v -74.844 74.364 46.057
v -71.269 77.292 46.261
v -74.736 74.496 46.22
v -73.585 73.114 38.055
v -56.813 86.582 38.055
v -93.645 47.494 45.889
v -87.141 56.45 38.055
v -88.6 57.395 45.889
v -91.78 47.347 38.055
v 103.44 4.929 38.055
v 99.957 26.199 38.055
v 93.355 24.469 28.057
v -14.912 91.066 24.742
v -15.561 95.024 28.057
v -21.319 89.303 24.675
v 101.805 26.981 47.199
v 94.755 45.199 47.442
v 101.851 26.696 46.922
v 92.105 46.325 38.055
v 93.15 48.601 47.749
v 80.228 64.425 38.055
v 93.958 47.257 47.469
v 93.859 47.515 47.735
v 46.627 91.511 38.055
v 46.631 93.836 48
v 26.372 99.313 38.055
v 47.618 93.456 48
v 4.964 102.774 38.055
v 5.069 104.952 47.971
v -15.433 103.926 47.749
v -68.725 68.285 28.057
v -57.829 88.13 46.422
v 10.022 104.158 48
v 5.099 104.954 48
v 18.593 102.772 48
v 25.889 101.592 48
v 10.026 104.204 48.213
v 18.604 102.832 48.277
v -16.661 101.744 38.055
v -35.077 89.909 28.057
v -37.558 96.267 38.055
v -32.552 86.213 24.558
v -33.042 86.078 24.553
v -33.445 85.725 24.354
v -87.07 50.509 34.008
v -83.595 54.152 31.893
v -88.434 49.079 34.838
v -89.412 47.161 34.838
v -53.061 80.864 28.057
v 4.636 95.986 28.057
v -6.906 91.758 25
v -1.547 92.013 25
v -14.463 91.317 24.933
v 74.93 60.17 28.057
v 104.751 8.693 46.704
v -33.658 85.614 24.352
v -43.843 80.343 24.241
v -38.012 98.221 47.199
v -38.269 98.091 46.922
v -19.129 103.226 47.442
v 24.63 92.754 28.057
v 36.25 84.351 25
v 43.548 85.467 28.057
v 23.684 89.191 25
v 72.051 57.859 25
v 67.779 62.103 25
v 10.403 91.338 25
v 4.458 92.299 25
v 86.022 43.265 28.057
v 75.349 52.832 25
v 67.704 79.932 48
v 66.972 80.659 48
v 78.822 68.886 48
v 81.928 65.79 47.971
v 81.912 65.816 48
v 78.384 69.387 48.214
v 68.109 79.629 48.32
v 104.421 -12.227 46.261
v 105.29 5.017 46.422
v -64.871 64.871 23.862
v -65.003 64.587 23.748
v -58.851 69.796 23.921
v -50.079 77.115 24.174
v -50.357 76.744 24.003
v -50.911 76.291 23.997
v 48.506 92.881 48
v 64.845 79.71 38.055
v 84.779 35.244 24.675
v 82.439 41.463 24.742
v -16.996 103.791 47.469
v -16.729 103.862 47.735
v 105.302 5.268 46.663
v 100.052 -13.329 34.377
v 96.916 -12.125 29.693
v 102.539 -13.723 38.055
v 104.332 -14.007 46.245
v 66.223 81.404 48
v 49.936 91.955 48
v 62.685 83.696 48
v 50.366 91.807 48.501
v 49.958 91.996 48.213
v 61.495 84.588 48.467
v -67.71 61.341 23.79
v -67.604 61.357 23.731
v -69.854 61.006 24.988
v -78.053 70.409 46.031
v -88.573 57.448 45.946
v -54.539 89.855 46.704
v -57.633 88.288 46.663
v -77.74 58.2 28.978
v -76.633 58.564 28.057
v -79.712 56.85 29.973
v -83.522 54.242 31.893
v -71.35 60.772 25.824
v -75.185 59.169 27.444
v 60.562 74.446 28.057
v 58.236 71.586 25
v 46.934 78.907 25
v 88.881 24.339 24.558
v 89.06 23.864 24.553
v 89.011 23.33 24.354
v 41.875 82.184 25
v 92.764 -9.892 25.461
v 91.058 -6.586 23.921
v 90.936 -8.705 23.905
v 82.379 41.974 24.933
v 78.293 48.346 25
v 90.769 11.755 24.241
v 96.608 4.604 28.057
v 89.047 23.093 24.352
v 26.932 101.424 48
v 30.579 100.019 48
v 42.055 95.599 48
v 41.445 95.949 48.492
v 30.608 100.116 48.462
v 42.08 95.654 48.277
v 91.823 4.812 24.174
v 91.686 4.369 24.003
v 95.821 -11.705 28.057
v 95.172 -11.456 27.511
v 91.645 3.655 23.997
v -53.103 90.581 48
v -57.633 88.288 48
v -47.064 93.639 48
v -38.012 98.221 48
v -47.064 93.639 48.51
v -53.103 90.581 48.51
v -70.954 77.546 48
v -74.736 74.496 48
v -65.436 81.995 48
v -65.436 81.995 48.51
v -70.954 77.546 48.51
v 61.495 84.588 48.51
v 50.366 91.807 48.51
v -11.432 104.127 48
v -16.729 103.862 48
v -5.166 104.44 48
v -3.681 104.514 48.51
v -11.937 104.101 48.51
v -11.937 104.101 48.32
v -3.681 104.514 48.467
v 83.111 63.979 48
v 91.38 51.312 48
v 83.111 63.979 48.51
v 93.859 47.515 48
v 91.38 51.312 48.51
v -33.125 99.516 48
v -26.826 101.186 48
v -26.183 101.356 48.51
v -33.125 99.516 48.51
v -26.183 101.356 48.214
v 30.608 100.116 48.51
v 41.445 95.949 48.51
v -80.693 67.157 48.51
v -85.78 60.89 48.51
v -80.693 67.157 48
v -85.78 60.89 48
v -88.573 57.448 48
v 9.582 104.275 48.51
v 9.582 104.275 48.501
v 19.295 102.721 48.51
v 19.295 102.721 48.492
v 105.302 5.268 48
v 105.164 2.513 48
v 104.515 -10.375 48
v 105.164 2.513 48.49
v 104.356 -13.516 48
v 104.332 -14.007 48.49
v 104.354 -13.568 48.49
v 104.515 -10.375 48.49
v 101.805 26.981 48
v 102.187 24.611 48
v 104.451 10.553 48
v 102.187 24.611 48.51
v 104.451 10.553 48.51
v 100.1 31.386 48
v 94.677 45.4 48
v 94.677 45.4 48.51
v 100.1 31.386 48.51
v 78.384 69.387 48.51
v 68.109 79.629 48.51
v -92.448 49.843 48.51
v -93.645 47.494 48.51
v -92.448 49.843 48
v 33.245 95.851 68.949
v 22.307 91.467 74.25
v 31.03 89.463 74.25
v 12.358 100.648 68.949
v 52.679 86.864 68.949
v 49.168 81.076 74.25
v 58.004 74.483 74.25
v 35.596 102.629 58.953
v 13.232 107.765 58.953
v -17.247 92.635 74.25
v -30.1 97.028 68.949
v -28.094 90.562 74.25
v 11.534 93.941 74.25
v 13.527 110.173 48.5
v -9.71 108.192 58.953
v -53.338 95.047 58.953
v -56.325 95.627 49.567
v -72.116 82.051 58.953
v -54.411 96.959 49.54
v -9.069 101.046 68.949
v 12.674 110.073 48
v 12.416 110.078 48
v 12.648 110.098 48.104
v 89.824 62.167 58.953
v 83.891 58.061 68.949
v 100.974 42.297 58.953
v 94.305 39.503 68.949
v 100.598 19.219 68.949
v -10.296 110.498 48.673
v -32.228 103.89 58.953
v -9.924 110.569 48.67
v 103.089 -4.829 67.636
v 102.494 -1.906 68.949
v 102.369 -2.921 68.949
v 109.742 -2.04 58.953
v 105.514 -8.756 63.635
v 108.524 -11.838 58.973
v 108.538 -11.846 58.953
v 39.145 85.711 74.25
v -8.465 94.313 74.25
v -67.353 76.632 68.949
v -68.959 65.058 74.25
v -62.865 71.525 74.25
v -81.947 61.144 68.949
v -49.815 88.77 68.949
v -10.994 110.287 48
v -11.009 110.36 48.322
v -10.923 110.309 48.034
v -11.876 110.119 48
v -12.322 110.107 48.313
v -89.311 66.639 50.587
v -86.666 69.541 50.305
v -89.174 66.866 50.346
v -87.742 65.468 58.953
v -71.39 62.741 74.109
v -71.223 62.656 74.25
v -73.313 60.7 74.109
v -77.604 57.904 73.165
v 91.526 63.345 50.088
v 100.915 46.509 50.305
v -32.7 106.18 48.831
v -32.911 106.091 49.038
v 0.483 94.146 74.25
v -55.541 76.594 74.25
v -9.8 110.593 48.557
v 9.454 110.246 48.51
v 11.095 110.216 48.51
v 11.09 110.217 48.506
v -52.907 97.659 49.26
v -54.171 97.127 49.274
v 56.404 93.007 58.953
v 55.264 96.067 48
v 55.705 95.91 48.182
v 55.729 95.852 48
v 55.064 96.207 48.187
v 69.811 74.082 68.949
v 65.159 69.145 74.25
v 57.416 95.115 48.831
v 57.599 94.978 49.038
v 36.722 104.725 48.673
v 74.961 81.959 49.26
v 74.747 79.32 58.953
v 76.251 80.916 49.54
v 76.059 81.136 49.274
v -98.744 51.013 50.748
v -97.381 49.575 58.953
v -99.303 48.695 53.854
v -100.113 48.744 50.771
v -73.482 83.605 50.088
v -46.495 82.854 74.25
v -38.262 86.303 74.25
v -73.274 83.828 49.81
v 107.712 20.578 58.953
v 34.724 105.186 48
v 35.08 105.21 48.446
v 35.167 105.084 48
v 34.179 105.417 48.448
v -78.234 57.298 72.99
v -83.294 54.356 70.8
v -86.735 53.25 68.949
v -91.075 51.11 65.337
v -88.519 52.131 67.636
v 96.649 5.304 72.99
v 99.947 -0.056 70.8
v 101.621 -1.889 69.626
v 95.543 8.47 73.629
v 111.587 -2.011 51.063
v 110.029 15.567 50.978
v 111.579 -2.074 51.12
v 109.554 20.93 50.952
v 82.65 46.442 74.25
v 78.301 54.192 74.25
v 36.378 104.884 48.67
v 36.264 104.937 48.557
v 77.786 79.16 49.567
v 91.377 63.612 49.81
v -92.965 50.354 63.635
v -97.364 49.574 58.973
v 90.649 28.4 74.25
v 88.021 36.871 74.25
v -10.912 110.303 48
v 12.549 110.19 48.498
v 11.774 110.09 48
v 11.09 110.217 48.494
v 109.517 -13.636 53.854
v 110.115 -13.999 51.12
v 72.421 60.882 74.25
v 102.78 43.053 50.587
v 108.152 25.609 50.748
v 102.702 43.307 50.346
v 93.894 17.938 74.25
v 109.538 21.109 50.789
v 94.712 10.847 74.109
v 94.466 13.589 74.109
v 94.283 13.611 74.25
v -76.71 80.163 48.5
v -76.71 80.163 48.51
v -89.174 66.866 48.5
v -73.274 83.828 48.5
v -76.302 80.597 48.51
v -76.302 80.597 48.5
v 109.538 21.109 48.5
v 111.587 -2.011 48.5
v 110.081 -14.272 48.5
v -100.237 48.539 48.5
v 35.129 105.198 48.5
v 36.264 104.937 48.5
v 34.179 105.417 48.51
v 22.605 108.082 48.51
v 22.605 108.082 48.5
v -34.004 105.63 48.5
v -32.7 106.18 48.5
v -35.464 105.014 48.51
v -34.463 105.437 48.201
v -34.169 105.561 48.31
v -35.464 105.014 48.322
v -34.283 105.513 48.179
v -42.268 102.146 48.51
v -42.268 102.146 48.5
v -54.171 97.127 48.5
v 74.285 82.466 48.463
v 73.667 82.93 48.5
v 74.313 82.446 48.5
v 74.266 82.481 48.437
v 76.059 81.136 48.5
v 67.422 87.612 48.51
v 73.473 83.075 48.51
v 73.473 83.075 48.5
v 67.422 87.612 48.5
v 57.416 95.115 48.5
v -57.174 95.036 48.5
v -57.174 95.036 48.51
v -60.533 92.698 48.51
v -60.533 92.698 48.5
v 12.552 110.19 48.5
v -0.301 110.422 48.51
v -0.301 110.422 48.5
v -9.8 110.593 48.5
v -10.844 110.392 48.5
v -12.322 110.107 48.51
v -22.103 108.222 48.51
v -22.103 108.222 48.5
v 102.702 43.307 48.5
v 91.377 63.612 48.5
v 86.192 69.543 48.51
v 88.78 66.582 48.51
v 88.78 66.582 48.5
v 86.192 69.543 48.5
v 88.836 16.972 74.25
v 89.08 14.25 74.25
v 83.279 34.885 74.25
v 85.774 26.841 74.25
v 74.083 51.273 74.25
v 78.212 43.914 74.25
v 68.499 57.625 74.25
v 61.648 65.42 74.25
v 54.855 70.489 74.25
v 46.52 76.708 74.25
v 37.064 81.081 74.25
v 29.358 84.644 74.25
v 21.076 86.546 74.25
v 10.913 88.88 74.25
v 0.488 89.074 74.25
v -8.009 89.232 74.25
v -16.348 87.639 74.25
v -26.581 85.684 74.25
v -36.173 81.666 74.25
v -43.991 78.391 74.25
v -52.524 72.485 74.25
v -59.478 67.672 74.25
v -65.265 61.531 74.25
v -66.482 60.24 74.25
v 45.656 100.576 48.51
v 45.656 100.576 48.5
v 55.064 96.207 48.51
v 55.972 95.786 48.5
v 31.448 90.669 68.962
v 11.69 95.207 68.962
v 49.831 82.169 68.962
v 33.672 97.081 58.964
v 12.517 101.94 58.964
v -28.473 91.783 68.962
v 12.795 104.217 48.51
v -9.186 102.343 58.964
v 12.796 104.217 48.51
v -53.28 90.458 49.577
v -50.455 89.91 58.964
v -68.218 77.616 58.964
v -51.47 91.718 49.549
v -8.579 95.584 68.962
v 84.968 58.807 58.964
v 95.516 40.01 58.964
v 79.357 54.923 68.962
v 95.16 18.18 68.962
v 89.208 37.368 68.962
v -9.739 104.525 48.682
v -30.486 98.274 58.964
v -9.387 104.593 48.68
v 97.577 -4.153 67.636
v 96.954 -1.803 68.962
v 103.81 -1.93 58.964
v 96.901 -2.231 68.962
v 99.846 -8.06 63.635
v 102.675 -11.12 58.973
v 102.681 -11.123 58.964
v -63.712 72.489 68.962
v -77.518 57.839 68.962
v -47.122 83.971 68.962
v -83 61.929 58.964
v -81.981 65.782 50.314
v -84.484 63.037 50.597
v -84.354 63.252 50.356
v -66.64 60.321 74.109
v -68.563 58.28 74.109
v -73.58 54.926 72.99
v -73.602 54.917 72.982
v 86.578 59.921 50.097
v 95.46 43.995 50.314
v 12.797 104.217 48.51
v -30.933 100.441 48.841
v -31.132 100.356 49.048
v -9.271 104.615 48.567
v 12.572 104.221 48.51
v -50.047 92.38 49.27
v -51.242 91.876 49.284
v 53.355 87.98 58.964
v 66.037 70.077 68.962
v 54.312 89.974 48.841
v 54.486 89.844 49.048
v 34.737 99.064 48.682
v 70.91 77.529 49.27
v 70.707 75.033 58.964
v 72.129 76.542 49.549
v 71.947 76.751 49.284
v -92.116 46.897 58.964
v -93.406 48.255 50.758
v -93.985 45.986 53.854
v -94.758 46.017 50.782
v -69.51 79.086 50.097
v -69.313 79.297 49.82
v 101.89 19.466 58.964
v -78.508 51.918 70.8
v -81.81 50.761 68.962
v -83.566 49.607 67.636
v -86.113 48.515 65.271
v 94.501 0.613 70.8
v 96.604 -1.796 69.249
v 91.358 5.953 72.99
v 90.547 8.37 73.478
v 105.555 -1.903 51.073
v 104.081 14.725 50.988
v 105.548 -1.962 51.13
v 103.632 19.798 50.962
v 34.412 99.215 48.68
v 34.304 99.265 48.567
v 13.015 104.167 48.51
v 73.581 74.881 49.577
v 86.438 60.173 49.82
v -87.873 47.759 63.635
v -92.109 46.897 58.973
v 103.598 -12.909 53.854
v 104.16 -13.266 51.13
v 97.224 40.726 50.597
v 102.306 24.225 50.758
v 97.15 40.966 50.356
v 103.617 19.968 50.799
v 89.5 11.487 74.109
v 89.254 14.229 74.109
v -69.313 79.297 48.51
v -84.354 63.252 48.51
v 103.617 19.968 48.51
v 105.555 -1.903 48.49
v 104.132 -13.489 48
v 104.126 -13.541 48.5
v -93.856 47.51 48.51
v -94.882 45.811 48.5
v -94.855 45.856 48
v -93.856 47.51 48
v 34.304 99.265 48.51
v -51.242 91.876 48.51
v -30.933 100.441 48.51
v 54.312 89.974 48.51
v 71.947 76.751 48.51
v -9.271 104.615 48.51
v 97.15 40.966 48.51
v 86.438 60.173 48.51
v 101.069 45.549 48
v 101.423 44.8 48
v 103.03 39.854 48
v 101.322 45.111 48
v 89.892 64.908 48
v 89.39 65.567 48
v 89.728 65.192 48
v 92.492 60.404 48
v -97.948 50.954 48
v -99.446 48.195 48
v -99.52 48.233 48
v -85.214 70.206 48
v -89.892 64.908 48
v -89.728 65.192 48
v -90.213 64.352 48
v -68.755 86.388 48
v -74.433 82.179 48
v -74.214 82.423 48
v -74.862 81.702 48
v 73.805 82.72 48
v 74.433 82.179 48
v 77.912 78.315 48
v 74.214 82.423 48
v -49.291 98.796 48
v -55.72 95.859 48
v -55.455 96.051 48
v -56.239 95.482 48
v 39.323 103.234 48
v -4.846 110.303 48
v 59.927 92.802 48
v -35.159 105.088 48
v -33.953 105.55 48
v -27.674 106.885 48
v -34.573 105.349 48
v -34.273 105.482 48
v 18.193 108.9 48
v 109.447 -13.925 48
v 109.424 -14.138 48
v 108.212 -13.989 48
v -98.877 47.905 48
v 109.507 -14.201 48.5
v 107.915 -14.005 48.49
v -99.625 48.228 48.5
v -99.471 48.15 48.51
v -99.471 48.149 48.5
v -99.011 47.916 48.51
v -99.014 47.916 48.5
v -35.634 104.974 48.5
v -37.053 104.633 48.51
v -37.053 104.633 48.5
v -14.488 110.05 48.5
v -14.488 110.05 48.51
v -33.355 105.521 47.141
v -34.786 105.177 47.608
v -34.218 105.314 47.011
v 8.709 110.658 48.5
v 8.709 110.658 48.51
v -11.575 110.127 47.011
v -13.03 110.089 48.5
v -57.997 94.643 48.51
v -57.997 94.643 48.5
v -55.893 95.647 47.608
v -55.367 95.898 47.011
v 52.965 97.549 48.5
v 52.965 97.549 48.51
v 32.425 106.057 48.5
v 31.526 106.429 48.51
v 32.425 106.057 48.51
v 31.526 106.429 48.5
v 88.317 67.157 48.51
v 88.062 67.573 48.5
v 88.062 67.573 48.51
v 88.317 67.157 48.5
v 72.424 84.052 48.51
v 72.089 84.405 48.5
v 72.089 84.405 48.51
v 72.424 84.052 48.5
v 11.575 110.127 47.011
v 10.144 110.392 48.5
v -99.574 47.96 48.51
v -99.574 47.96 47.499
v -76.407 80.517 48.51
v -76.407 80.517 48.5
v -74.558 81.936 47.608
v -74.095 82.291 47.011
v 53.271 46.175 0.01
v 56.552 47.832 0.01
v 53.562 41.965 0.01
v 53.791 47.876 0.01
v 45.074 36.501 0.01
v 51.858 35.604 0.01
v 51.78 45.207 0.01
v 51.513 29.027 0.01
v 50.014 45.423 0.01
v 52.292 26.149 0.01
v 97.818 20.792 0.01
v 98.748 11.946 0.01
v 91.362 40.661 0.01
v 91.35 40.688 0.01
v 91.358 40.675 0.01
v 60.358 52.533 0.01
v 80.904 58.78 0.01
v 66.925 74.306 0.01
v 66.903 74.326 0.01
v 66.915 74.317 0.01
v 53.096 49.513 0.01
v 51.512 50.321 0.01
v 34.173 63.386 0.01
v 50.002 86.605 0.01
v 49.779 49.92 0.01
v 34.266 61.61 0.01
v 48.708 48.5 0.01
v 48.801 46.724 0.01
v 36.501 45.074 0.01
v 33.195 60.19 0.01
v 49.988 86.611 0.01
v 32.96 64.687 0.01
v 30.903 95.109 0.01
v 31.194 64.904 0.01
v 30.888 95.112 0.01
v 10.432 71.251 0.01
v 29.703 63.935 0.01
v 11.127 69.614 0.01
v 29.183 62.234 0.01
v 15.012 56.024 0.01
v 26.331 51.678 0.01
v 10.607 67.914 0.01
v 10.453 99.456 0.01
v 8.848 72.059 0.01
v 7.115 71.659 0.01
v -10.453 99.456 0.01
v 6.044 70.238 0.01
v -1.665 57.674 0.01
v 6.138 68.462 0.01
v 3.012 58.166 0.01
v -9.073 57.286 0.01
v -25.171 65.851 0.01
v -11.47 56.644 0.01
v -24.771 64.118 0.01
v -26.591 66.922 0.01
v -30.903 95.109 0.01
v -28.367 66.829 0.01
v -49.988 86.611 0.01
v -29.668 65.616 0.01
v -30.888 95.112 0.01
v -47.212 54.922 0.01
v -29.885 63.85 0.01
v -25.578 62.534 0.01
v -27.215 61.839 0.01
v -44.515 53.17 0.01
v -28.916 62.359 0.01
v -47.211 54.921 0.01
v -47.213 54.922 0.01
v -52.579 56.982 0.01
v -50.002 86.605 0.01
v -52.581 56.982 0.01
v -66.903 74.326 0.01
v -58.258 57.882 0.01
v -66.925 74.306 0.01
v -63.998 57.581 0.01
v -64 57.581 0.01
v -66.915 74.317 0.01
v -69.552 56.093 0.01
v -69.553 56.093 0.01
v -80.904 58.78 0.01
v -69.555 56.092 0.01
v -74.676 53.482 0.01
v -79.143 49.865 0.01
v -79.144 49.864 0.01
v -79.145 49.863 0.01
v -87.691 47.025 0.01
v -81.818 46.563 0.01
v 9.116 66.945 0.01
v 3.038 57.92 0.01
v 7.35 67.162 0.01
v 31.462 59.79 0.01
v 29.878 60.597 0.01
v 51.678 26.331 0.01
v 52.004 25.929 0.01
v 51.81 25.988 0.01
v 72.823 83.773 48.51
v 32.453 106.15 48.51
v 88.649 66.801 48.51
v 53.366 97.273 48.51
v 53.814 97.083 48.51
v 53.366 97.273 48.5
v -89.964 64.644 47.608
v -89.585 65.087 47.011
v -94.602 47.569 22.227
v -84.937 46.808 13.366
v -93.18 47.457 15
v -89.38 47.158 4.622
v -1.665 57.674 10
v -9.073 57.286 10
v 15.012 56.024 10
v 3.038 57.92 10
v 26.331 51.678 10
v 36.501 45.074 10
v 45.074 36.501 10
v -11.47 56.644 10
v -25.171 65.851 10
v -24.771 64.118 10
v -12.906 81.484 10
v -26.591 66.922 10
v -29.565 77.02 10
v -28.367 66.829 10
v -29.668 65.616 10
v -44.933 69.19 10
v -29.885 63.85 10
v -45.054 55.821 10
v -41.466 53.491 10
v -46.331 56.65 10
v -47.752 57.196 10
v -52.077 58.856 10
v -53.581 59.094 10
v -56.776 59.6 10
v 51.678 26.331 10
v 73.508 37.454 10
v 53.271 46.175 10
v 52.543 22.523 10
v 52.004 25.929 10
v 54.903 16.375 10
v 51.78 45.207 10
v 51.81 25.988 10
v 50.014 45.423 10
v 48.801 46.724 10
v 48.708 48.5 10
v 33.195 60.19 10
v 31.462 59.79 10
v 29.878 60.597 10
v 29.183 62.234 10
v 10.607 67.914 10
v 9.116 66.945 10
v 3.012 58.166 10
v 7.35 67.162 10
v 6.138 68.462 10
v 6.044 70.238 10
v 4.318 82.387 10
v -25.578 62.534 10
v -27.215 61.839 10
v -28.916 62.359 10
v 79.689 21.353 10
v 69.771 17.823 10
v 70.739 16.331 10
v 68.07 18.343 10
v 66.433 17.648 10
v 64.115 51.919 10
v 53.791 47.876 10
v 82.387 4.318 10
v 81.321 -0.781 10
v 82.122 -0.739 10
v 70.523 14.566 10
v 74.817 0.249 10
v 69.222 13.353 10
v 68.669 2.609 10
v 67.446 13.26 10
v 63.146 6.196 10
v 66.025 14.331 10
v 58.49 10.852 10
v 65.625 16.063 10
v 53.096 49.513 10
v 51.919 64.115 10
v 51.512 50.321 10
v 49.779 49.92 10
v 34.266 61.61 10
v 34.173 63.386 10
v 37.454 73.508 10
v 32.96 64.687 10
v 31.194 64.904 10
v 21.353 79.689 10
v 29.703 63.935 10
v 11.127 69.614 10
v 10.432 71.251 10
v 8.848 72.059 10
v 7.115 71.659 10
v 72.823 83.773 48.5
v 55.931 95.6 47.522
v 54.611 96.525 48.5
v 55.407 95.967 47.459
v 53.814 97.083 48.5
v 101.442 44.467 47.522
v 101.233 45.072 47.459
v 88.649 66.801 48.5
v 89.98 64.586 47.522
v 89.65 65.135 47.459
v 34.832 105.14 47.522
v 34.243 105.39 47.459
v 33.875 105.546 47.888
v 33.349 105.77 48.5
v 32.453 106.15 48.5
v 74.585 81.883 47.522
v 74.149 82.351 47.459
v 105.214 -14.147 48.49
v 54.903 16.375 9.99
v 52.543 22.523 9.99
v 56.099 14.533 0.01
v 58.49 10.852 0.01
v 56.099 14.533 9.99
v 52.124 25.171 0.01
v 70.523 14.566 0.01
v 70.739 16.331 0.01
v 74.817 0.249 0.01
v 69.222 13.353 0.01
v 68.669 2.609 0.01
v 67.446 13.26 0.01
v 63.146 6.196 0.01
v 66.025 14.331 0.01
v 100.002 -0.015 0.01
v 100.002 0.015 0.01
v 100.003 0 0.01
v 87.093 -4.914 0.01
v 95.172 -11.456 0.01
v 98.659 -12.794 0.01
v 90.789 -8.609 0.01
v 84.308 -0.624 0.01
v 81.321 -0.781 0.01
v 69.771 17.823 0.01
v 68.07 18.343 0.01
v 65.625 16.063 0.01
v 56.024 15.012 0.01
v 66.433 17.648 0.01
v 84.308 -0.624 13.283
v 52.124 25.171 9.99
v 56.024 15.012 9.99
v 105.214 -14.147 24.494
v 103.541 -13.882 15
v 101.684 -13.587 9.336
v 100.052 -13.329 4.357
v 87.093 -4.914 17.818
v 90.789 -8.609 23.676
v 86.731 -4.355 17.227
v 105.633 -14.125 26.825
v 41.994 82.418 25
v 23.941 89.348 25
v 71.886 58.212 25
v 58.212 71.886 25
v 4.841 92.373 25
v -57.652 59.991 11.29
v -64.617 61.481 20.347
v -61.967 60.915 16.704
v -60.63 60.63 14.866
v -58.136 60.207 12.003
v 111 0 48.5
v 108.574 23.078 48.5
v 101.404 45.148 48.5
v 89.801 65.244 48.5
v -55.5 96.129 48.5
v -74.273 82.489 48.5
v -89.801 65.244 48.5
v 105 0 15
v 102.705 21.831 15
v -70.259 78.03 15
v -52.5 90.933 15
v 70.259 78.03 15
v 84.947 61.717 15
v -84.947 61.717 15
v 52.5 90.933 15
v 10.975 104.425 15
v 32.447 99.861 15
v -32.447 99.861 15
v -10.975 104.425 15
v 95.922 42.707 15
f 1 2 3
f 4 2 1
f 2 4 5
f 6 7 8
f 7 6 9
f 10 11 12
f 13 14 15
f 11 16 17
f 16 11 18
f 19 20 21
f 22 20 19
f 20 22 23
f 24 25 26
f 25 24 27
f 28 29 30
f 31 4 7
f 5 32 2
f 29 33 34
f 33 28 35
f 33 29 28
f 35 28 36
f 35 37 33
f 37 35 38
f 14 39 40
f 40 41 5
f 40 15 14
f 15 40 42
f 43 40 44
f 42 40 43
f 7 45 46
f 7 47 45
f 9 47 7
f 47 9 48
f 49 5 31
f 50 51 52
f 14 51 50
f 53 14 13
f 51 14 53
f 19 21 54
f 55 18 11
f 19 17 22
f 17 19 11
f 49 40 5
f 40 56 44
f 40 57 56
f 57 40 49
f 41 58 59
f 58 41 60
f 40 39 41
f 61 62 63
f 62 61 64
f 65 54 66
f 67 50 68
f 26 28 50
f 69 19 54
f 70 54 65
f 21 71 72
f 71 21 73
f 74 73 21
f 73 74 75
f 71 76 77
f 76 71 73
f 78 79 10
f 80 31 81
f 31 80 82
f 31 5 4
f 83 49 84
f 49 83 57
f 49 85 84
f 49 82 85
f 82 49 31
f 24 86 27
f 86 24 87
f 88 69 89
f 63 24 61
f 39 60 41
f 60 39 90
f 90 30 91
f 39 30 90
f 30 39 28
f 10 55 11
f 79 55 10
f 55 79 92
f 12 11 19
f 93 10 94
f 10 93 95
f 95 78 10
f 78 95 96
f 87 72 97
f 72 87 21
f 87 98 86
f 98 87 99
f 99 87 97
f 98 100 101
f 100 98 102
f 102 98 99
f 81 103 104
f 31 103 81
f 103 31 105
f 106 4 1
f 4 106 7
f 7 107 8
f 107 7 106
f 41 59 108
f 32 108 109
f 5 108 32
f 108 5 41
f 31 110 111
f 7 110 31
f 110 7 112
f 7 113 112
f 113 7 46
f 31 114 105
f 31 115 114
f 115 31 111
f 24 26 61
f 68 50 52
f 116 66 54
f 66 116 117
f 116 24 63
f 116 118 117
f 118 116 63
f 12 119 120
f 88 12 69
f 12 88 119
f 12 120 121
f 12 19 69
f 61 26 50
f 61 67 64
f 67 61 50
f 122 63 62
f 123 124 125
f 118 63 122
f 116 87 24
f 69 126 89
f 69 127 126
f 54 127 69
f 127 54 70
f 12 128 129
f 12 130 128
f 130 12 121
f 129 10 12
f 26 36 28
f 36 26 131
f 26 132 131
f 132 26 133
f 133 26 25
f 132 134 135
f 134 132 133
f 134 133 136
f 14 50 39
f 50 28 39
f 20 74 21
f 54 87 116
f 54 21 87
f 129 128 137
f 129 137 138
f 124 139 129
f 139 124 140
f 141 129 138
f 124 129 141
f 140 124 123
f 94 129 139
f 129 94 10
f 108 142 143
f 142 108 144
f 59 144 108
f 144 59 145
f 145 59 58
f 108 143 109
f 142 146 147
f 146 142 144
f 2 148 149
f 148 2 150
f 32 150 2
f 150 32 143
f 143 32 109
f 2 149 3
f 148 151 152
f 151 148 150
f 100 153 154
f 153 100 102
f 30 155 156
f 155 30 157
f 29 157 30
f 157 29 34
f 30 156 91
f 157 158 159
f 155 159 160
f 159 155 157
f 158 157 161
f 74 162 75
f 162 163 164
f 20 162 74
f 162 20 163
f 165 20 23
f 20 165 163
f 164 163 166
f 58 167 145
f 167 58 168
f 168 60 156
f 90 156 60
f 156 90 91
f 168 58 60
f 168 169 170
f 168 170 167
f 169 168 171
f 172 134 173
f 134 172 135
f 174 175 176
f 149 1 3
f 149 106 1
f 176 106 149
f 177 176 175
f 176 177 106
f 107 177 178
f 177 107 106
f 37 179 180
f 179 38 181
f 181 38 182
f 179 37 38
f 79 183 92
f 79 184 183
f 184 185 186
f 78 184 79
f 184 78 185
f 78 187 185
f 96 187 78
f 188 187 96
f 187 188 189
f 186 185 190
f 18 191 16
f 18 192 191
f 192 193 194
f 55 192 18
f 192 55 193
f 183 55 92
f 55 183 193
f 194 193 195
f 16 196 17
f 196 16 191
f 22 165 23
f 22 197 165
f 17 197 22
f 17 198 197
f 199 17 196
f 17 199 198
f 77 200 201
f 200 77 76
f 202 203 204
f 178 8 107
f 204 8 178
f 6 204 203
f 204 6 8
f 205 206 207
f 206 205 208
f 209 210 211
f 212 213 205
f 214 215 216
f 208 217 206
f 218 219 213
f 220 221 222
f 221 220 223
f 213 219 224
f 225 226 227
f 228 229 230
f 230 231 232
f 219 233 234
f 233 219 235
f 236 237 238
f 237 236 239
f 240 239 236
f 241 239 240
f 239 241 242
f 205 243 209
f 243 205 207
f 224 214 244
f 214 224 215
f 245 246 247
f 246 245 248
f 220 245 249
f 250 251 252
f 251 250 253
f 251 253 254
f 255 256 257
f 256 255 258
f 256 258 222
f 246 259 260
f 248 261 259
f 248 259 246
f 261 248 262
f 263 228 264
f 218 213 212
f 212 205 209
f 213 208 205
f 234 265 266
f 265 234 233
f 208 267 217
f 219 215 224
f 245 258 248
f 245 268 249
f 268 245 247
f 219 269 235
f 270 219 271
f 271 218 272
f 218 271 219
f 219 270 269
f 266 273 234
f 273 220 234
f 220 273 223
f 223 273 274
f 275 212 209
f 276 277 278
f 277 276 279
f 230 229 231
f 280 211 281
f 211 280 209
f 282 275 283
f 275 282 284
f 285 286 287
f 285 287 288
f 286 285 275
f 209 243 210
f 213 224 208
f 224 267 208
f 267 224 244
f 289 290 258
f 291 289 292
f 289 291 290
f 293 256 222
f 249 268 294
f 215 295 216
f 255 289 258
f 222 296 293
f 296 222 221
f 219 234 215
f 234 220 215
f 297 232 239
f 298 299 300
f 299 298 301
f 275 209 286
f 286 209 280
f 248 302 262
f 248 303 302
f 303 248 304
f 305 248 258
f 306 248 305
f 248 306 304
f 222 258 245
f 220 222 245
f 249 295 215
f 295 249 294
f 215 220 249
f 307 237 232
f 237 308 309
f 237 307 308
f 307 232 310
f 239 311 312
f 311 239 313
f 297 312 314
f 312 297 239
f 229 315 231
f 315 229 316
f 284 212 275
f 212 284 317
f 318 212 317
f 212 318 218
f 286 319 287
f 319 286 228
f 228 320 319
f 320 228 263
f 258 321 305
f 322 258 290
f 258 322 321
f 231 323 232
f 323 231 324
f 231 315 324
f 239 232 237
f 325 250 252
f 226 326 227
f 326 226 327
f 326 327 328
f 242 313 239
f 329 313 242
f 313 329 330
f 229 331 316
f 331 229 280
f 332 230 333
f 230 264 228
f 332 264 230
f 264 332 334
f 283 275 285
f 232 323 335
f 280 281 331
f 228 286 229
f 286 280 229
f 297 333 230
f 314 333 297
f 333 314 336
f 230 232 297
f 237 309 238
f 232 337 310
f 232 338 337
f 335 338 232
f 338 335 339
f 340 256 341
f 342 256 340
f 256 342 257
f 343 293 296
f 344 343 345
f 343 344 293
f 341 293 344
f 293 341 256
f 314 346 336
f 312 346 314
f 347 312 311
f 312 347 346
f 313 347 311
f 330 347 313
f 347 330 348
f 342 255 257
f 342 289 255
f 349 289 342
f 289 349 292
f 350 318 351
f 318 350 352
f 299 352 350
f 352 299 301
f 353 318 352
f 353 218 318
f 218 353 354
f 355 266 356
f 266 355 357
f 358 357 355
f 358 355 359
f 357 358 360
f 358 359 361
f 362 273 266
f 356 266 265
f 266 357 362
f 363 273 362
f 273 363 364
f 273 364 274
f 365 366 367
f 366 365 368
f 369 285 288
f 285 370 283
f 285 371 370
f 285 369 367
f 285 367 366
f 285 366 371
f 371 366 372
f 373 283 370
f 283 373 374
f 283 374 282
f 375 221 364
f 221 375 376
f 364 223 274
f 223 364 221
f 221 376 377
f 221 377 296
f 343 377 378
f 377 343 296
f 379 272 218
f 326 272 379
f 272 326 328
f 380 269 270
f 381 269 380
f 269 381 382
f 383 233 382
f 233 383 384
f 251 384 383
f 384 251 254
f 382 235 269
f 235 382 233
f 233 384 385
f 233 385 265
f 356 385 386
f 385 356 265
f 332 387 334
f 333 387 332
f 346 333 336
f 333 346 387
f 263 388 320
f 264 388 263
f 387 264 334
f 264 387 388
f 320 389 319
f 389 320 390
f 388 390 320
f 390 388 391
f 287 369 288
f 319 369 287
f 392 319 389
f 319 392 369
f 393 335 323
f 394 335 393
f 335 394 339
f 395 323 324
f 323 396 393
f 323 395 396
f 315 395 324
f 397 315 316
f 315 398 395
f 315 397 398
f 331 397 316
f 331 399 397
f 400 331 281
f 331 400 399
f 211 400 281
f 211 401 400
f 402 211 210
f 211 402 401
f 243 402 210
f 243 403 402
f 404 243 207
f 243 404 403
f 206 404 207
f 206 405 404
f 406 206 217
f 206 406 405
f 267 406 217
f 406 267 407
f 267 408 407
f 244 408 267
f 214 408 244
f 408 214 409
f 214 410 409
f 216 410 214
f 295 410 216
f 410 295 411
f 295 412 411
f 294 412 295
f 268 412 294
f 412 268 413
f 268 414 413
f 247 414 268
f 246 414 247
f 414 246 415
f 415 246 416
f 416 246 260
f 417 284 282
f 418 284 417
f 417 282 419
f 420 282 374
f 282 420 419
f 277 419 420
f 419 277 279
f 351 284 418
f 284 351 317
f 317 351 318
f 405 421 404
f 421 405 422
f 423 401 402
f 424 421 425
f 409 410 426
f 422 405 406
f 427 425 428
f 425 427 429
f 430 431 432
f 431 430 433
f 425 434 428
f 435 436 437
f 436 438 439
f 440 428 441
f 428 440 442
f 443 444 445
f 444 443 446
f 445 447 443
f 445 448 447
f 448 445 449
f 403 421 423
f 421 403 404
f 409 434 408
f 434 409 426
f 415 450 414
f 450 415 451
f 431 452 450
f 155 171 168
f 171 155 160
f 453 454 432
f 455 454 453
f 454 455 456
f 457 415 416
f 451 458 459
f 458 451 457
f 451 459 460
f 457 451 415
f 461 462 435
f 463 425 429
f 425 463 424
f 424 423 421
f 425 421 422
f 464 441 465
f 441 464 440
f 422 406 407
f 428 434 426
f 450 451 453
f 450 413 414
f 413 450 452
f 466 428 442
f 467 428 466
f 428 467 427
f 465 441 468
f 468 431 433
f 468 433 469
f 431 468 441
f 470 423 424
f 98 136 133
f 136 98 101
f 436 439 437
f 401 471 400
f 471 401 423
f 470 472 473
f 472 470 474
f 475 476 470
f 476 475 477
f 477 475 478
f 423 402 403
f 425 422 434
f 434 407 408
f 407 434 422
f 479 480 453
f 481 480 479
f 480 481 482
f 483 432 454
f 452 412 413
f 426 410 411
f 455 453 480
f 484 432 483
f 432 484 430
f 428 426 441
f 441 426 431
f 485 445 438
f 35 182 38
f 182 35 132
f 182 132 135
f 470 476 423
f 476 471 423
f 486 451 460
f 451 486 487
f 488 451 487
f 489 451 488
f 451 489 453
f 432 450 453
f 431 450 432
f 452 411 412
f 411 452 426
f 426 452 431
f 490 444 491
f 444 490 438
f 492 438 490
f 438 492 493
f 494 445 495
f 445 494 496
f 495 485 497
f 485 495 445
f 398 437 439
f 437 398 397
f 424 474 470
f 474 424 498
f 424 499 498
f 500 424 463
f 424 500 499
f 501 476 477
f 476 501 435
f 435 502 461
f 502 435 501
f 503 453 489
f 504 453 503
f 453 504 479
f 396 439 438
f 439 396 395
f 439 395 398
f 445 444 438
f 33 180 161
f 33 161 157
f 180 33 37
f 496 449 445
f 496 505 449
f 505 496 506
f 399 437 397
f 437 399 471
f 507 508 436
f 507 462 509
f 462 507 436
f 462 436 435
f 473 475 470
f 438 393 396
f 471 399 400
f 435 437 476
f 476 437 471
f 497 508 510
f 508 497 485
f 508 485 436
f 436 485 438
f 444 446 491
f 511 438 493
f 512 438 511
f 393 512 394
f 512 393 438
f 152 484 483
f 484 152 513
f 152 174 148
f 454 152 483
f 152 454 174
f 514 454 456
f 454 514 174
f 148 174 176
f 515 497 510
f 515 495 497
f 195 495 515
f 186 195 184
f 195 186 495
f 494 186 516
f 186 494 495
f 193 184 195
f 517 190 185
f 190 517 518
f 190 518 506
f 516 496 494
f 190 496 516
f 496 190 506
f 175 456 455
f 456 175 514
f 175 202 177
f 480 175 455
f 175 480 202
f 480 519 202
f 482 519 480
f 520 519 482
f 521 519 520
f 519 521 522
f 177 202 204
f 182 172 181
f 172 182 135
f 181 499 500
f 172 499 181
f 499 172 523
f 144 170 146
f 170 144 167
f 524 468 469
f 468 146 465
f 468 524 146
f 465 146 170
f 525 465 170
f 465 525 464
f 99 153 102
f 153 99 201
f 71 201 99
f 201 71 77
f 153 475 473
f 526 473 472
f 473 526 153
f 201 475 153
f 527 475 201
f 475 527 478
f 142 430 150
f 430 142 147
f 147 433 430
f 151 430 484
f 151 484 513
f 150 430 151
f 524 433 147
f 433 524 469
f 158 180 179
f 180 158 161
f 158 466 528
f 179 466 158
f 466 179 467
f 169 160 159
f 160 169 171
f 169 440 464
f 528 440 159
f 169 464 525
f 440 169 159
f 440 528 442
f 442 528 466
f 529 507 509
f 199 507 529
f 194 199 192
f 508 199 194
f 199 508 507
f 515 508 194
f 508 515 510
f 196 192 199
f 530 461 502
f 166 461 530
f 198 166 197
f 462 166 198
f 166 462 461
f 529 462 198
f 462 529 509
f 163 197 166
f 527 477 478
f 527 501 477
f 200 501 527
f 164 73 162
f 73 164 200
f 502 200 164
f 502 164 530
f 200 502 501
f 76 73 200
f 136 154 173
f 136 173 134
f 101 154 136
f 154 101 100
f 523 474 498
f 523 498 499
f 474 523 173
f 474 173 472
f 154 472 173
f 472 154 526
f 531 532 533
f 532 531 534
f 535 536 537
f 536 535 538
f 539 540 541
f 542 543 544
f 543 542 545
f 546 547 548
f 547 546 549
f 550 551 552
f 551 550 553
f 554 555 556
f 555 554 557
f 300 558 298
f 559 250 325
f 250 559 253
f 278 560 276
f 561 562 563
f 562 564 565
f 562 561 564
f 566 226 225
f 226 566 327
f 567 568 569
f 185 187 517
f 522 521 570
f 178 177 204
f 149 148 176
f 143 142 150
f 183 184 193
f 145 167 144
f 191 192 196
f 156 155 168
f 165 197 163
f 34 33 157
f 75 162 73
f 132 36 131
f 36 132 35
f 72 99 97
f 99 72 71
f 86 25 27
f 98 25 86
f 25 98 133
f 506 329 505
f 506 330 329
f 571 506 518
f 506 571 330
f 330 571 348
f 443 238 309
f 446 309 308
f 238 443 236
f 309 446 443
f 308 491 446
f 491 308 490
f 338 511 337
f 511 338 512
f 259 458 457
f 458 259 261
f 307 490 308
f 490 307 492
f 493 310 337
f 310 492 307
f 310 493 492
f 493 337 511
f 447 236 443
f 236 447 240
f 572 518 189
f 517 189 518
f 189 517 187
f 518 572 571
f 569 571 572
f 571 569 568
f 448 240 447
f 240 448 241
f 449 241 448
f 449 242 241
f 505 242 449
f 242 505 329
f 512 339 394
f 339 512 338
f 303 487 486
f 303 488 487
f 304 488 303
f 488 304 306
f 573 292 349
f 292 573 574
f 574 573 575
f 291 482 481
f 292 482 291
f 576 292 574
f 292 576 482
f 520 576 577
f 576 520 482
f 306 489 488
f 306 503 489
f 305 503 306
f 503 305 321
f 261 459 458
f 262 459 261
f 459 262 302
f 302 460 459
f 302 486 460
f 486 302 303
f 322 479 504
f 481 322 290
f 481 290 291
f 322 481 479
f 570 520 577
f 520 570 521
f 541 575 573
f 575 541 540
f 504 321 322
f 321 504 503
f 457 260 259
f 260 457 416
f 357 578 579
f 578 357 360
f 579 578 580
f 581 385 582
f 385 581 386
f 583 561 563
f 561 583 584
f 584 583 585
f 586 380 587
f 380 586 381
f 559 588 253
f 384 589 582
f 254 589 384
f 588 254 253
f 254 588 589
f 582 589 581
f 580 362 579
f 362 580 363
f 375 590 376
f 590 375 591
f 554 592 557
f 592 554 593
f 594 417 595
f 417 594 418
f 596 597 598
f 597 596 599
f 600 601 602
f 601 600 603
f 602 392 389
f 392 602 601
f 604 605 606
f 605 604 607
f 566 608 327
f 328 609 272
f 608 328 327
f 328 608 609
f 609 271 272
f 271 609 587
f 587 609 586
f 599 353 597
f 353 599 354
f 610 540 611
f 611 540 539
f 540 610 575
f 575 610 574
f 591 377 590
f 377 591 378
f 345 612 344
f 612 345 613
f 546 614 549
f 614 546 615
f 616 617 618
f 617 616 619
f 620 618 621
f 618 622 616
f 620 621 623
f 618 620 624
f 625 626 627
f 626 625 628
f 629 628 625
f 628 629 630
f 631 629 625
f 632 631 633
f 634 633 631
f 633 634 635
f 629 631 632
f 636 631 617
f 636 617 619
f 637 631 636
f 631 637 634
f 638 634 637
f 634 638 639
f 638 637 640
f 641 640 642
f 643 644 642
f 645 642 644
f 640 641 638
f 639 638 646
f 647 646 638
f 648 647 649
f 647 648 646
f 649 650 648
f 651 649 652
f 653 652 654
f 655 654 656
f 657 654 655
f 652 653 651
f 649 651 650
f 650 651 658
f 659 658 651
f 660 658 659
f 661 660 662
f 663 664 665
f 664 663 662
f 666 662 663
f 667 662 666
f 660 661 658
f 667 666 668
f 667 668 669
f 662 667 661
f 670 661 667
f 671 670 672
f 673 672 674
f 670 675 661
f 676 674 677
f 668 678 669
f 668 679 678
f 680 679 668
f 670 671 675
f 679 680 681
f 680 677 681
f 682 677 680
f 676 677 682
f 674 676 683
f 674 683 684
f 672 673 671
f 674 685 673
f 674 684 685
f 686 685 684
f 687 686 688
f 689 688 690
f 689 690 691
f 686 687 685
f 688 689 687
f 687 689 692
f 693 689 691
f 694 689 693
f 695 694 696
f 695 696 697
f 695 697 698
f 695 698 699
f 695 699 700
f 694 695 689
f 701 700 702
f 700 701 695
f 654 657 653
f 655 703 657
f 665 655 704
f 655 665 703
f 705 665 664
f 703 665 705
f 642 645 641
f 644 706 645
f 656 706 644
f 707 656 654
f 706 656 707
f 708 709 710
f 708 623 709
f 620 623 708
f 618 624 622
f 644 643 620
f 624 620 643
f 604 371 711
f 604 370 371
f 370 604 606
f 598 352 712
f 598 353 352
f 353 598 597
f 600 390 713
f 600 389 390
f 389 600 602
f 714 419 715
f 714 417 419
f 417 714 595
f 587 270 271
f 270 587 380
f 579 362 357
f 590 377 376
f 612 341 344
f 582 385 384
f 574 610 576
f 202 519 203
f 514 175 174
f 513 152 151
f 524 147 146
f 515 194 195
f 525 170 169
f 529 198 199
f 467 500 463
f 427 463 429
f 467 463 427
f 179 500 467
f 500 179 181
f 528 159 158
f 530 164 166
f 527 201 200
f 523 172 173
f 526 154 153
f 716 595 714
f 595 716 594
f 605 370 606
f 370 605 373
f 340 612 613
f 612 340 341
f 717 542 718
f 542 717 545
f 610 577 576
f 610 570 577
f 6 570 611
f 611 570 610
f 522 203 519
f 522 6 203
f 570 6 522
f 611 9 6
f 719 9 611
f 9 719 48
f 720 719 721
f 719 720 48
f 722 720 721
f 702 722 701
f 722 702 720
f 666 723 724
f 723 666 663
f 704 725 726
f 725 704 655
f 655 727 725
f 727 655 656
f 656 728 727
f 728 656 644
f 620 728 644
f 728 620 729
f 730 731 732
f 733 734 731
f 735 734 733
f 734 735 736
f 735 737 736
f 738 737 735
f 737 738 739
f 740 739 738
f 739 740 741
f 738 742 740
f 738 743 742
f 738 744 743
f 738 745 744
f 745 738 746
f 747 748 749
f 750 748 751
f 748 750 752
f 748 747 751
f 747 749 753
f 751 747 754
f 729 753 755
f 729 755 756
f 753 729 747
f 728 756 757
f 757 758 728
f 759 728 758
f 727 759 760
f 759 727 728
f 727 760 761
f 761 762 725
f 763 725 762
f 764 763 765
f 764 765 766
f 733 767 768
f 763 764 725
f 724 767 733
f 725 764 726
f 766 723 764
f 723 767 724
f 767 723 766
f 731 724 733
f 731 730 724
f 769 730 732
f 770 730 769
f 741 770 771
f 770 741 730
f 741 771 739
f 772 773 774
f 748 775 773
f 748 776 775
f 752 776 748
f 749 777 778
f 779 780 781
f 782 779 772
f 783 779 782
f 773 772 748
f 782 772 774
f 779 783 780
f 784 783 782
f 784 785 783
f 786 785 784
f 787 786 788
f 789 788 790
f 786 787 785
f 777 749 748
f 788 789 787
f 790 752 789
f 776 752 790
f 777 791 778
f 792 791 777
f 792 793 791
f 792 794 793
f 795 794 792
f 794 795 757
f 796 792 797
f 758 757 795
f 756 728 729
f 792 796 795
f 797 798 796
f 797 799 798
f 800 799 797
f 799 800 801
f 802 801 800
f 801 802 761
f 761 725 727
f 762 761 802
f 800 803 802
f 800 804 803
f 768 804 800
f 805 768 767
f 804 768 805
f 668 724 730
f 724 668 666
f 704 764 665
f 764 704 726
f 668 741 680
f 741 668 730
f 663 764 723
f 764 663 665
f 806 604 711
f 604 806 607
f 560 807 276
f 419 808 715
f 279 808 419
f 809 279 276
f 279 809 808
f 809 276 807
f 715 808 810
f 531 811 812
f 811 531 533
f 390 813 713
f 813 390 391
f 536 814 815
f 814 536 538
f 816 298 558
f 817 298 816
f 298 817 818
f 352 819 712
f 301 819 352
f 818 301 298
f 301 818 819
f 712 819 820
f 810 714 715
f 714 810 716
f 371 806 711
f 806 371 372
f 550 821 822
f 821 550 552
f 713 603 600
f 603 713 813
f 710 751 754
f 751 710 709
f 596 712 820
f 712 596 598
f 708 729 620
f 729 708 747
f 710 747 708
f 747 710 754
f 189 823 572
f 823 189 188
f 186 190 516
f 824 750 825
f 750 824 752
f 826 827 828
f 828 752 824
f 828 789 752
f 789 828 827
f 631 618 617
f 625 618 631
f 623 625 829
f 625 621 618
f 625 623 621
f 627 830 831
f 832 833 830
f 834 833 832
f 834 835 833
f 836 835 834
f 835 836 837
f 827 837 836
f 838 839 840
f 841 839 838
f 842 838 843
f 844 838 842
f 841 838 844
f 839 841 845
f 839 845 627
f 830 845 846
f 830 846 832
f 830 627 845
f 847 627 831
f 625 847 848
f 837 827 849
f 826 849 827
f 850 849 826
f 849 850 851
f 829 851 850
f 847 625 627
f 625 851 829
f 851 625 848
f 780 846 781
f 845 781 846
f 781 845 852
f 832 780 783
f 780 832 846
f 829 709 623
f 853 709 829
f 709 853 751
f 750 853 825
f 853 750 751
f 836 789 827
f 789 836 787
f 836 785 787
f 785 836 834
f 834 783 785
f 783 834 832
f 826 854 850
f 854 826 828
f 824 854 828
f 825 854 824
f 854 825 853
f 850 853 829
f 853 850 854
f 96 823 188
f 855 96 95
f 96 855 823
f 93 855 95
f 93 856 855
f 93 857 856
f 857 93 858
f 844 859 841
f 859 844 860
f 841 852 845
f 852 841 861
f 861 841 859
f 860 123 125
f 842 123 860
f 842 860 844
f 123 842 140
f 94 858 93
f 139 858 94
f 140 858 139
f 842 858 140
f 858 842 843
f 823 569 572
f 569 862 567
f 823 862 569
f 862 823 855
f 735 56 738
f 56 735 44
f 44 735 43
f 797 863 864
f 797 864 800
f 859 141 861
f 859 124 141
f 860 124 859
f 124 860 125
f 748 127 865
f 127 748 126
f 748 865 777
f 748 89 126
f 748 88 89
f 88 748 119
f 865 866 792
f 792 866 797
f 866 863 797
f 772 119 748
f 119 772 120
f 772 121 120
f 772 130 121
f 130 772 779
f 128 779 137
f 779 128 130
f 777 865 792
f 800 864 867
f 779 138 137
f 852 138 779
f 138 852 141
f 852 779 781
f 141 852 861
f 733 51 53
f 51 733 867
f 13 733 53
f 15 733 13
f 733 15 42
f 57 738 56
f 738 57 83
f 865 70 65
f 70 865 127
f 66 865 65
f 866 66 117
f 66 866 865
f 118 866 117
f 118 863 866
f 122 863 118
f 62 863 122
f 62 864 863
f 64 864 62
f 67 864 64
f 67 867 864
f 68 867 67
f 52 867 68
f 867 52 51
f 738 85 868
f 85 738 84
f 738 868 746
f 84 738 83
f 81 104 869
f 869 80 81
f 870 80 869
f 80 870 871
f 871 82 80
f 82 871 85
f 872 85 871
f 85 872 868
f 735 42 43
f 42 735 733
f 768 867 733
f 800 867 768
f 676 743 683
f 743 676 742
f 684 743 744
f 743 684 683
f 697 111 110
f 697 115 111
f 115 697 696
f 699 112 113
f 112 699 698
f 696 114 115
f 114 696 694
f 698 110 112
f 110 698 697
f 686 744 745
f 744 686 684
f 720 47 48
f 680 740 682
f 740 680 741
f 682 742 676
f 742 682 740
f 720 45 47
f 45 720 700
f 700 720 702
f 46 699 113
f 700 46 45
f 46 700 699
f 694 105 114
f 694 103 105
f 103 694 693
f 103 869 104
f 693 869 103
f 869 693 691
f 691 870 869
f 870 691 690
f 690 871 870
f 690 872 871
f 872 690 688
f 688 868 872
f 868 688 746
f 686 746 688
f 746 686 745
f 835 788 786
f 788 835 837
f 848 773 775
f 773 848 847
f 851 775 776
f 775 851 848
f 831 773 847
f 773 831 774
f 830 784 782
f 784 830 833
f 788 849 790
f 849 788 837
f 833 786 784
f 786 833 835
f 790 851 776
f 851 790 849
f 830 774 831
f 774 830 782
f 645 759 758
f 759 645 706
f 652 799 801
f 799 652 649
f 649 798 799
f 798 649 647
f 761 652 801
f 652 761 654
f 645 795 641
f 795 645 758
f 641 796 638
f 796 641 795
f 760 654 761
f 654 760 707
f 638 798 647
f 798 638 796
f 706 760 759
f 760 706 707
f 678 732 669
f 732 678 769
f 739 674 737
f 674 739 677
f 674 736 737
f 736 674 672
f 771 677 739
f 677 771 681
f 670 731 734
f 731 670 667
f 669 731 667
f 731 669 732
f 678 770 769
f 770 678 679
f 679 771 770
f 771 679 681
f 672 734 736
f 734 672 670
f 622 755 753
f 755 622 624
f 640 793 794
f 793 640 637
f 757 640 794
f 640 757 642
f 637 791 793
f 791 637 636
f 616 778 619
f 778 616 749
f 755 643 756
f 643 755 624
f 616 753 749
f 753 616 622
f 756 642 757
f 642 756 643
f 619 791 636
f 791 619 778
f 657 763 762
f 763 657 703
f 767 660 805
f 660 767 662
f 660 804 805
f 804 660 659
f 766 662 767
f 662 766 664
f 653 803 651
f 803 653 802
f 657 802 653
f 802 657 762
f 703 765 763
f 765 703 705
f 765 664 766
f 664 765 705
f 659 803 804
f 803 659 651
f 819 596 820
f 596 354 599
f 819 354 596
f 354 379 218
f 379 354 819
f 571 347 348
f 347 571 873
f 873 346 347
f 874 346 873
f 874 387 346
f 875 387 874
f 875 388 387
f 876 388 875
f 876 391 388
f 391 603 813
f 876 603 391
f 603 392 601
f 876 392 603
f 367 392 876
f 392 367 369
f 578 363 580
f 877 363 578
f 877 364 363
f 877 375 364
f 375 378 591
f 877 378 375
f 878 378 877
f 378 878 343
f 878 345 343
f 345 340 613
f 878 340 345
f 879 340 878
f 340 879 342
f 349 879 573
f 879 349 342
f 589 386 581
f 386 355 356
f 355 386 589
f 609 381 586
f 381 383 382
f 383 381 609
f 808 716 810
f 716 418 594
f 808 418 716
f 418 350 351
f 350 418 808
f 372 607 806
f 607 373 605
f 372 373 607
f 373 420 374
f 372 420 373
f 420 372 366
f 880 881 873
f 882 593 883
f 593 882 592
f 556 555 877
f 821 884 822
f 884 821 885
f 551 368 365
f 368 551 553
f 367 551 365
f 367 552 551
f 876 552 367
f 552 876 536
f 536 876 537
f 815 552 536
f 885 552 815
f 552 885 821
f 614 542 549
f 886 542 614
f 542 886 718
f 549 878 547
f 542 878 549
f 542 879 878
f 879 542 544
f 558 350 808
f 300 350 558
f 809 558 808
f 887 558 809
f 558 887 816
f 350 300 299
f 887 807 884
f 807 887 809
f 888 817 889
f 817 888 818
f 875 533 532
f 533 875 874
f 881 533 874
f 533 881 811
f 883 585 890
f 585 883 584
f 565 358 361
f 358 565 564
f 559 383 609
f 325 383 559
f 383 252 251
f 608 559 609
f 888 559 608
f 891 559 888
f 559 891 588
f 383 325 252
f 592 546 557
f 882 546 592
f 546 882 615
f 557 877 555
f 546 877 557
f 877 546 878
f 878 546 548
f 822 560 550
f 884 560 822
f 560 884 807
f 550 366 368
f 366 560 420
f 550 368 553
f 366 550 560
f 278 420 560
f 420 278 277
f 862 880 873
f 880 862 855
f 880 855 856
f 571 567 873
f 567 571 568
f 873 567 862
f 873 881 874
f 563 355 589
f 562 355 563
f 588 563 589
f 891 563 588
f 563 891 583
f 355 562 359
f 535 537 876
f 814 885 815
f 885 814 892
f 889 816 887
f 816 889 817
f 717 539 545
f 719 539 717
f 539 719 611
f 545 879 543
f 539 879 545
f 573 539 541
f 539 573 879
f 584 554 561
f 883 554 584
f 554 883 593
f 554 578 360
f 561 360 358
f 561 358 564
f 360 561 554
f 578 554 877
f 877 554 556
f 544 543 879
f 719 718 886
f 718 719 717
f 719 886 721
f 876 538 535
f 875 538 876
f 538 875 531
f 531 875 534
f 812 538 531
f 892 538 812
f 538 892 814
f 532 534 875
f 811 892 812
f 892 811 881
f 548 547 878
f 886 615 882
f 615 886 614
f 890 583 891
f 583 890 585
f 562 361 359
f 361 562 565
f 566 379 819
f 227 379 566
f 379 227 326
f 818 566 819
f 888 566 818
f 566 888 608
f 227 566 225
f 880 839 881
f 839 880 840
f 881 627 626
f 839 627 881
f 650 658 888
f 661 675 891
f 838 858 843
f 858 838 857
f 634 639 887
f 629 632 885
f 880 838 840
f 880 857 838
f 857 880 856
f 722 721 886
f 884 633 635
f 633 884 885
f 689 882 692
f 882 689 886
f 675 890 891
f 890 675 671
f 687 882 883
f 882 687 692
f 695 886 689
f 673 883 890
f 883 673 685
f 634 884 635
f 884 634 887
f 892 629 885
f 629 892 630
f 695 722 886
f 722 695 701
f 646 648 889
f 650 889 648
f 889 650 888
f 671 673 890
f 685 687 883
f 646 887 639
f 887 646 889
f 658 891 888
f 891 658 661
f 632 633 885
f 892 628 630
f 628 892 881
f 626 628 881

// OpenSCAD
//$fa=3;

nothing = 0.01;
m4_bolt_hole_radius = 2*1.3;
m8_bolt_hole_radius = 4*1.3;

wheel_outer_radus = 90;
wheel_inner_max_radius = 65;
wheel_width = 51.5;
dist_btw_mount_bolts = 29.5;
mount_block_diameter = 53;
hub_to_mount_bolt_hole = 83;
motor_mount_to_wheel_centre = 48.5;
wheel_gear_diameter = 108;
pinion_diameter = 30;
pinion_height = 18+2;
sheild_height = 22;
pinion_to_hub_centre = 121-108/2;
cover_inner_to_outer = 11-1;
bolt_length = 20;
mount_block_thickness = 6;

mudguard_thickness = 6;
mudguard_inner_radus = wheel_outer_radus + 15;
mudguard_outer_radus = mudguard_inner_radus + mudguard_thickness;

outer_bevel_height = motor_mount_to_wheel_centre;

difference() {
    rotate([0,0,63])
    union() {
        //%wheel();
        //%mounting_bracket();
        //#gearing();
        difference() {
            mudguard();
            
            translate([0,pinion_to_hub_centre,0])
            cylinder(wheel_width, d1=55, d2=75, center=false);

        }
        //cover();
        difference() {
            internal_guard();
            mounting_holes_for_mudguard();
        }
    }
    
    outer_bevel();
}

module mounting_holes_for_mudguard() {
    for (radius_deg = [-50:50:50]) {
        rotate([0,0,radius_deg])
        translate([70, 0, 0])
        m4_bolt(20);
    }
    for (radius_deg = [-20:20:20]) {
        rotate([0,0,radius_deg])
        translate([70, 0, 0])
        m4_bolt(20);
    }
}

module internal_guard() {
    inner_wheel_extra = -10;
    internal_guard_height = 10;
    difference() {
        union() {
            difference() {
                rotate([0,0,22.5])
                translate([0,0,0+nothing])
                intersection() {
                    cylinder(outer_bevel_height, r=mudguard_outer_radus, center=false);
                    rotate([90,0,0])
                    {
                        translate([40,-wheel_width/2+5,-110])
                        cube([mudguard_outer_radus*2,outer_bevel_height*2,mudguard_outer_radus*2],false);
                    }
                }
                cylinder(internal_guard_height, d=wheel_gear_diameter+8, center=false);
                translate([0,pinion_to_hub_centre,0])
                cylinder(internal_guard_height, d=mount_block_diameter, center=false);
                translate([0,0,-3.75])
                resize([mudguard_inner_radus*2+inner_wheel_extra, mudguard_inner_radus*2+inner_wheel_extra, wheel_width+nothing])
                wheel();
                translate([49,21,0])rotate([0,0,123])translate([0,-5,-nothing])cube([50,10,50],false);
            }
            difference() {
                rotate([0,0,10])
                translate([0,0,0+nothing])
                intersection() {
                    cylinder(outer_bevel_height, r=mudguard_outer_radus, center=false);
                    rotate([90,0,0])
                    {
                        translate([40,-wheel_width/2+5,0])
                        cube([mudguard_outer_radus*2,outer_bevel_height*2,mudguard_outer_radus],false);
                    }
                }
                cylinder(internal_guard_height, d=wheel_gear_diameter+8, center=false);
                translate([0,pinion_to_hub_centre,0])
                cylinder(internal_guard_height, d=mount_block_diameter, center=false);
                translate([0,0,-3.75])
                resize([mudguard_inner_radus*2+inner_wheel_extra, mudguard_inner_radus*2+inner_wheel_extra, wheel_width+nothing])
                wheel();
            }
            difference() {
                translate([65,-60,nothing])
                cylinder(outer_bevel_height-nothing*2,d=63);
                translate([55+21,-58+3,0])
                rotate([0,0,10])
                cube([50,50,100], true);
                translate([0,0,-nothing])
                cylinder(internal_guard_height, d=wheel_gear_diameter+8, center=false);
                translate([0,0,-3.75])
                resize([mudguard_inner_radus*2+inner_wheel_extra, mudguard_inner_radus*2+inner_wheel_extra, wheel_width+nothing])
                wheel();
            }
            difference() {
                translate([58,-90,nothing])
                cylinder(outer_bevel_height-nothing*2,d=50);
                translate([55+21,-58+3,0])
                rotate([0,0,10])
                cube([50,50,100], true);
                translate([0,0,-nothing])
                cylinder(internal_guard_height, d=wheel_gear_diameter+8, center=false);
                translate([0,0,-3.75])
                resize([mudguard_inner_radus*2+inner_wheel_extra, mudguard_inner_radus*2+inner_wheel_extra, wheel_width+nothing])
                wheel();
            }
        }
        union() {
            resize([mudguard_inner_radus*2, mudguard_inner_radus*2, wheel_width+nothing])
            wheel();
            translate([0,0,internal_guard_height])
            cylinder(internal_guard_height+5, d1=mudguard_inner_radus*2-45,d2=mudguard_inner_radus*2-25, center=false);
            translate([0,pinion_to_hub_centre,0])
            cylinder(wheel_width, d1=55, d2=75, false);
        }
    }
}

module outer_bevel() {
    secondary_layer = 15;
    
    difference() {
            cylinder(h=outer_bevel_height, r=mudguard_outer_radus+51, center=false);
            translate([0,0,secondary_layer])
            cylinder(h=outer_bevel_height-secondary_layer, r1=mudguard_inner_radus,r2=mudguard_outer_radus, center=false);
            cylinder(h=secondary_layer, r1=mudguard_inner_radus-5,r2=mudguard_inner_radus, center=false);
    }
}

module cover() {
    difference() {
        translate([0,pinion_to_hub_centre,0])
        {
            difference() {
                union() {
                    cylinder(sheild_height, d=mount_block_diameter, center=false);
                    translate([25,24,+nothing])
                    cylinder(sheild_height, d=mount_block_diameter, center=false);
                    translate([-3,12,0+nothing])
                    cylinder(sheild_height, d=55, center=false);
                }
                translate([0,0,-nothing])
                cylinder(pinion_height, d=mount_block_diameter-cover_inner_to_outer*2, center=false);
                translate([-17,-5,-nothing])
                cylinder(pinion_height, d=20, center=false);
                translate([17,-5,-nothing])
                cylinder(pinion_height, d=20, center=false);
                translate([-10,0,-nothing])
                cylinder(pinion_height, d=20, center=false);
                translate([10,0,-nothing])
                cylinder(pinion_height, d=20, center=false);
                translate([0,18,-nothing])
                cylinder(pinion_height, d=10, center=false);
                translate([0,14,-nothing])
                cylinder(pinion_height, d=12, center=false);
            }
        }
        mounting_holes();
        cube([100,130,sheild_height*2+1], true);
    }
}

module gearing() {
    cylinder(pinion_height, d=wheel_gear_diameter, center=false);
    translate([0,pinion_to_hub_centre,0])
    cylinder(pinion_height, d=pinion_diameter, center=false);
}

module mudguard() {
    rotate([0,0,20])
    intersection() {
        difference() {
            resize([mudguard_outer_radus*2, mudguard_outer_radus*2, wheel_width])
            wheel();

            resize([mudguard_inner_radus*2, mudguard_inner_radus*2, wheel_width+nothing])
            wheel();
            cylinder(96,r=mudguard_inner_radus+12,center=true);
        }
        translate([25,0,motor_mount_to_wheel_centre])
        intersection () {
            mudguard_intersecton = mudguard_outer_radus*2+20;
            rotate([90,0,0])
            {
                translate([0,0,-mudguard_outer_radus])
                cylinder(mudguard_intersecton, r=wheel_width/2);
                translate([0,-wheel_width/2,-mudguard_outer_radus])
                cube([mudguard_intersecton,wheel_width,mudguard_intersecton],center=false);
            }
            rotate([90,0,-20])
            union() {
                translate([0,0,-mudguard_outer_radus])
                cylinder(mudguard_intersecton, r=wheel_width/2);
                translate([0,-wheel_width/2,-mudguard_outer_radus])
                cube([mudguard_intersecton,wheel_width,mudguard_intersecton],center=false);
            }
        }
    }
}

module mounting_bracket() {
    translate([0,pinion_to_hub_centre,-mount_block_thickness])
    cylinder(mount_block_thickness, r=mount_block_diameter/2);
}

module mounting_holes() {
    translate([0,hub_to_mount_bolt_hole,-nothing])
    {
        translate([dist_btw_mount_bolts/2,0,0])
        mounting_bolt_hole();
        translate([-dist_btw_mount_bolts/2,0,0])
        mounting_bolt_hole();
    }
}

module mounting_bolt_hole() {
    m4_bolt(50);
    translate([0,0,bolt_length-5])
    m8_bolt(50);
}

module m4_bolt(length) {
    cylinder(length, r=m4_bolt_hole_radius);
}

module m8_bolt(length) {
    cylinder(length, r=m8_bolt_hole_radius);
}

module wheel() {
    translate([0,0,motor_mount_to_wheel_centre])
    intersection() {
        resize([wheel_outer_radus*2,wheel_outer_radus*2,100])sphere(wheel_outer_radus);
        cylinder(wheel_width, r=wheel_outer_radus, center=true);
    }
}
